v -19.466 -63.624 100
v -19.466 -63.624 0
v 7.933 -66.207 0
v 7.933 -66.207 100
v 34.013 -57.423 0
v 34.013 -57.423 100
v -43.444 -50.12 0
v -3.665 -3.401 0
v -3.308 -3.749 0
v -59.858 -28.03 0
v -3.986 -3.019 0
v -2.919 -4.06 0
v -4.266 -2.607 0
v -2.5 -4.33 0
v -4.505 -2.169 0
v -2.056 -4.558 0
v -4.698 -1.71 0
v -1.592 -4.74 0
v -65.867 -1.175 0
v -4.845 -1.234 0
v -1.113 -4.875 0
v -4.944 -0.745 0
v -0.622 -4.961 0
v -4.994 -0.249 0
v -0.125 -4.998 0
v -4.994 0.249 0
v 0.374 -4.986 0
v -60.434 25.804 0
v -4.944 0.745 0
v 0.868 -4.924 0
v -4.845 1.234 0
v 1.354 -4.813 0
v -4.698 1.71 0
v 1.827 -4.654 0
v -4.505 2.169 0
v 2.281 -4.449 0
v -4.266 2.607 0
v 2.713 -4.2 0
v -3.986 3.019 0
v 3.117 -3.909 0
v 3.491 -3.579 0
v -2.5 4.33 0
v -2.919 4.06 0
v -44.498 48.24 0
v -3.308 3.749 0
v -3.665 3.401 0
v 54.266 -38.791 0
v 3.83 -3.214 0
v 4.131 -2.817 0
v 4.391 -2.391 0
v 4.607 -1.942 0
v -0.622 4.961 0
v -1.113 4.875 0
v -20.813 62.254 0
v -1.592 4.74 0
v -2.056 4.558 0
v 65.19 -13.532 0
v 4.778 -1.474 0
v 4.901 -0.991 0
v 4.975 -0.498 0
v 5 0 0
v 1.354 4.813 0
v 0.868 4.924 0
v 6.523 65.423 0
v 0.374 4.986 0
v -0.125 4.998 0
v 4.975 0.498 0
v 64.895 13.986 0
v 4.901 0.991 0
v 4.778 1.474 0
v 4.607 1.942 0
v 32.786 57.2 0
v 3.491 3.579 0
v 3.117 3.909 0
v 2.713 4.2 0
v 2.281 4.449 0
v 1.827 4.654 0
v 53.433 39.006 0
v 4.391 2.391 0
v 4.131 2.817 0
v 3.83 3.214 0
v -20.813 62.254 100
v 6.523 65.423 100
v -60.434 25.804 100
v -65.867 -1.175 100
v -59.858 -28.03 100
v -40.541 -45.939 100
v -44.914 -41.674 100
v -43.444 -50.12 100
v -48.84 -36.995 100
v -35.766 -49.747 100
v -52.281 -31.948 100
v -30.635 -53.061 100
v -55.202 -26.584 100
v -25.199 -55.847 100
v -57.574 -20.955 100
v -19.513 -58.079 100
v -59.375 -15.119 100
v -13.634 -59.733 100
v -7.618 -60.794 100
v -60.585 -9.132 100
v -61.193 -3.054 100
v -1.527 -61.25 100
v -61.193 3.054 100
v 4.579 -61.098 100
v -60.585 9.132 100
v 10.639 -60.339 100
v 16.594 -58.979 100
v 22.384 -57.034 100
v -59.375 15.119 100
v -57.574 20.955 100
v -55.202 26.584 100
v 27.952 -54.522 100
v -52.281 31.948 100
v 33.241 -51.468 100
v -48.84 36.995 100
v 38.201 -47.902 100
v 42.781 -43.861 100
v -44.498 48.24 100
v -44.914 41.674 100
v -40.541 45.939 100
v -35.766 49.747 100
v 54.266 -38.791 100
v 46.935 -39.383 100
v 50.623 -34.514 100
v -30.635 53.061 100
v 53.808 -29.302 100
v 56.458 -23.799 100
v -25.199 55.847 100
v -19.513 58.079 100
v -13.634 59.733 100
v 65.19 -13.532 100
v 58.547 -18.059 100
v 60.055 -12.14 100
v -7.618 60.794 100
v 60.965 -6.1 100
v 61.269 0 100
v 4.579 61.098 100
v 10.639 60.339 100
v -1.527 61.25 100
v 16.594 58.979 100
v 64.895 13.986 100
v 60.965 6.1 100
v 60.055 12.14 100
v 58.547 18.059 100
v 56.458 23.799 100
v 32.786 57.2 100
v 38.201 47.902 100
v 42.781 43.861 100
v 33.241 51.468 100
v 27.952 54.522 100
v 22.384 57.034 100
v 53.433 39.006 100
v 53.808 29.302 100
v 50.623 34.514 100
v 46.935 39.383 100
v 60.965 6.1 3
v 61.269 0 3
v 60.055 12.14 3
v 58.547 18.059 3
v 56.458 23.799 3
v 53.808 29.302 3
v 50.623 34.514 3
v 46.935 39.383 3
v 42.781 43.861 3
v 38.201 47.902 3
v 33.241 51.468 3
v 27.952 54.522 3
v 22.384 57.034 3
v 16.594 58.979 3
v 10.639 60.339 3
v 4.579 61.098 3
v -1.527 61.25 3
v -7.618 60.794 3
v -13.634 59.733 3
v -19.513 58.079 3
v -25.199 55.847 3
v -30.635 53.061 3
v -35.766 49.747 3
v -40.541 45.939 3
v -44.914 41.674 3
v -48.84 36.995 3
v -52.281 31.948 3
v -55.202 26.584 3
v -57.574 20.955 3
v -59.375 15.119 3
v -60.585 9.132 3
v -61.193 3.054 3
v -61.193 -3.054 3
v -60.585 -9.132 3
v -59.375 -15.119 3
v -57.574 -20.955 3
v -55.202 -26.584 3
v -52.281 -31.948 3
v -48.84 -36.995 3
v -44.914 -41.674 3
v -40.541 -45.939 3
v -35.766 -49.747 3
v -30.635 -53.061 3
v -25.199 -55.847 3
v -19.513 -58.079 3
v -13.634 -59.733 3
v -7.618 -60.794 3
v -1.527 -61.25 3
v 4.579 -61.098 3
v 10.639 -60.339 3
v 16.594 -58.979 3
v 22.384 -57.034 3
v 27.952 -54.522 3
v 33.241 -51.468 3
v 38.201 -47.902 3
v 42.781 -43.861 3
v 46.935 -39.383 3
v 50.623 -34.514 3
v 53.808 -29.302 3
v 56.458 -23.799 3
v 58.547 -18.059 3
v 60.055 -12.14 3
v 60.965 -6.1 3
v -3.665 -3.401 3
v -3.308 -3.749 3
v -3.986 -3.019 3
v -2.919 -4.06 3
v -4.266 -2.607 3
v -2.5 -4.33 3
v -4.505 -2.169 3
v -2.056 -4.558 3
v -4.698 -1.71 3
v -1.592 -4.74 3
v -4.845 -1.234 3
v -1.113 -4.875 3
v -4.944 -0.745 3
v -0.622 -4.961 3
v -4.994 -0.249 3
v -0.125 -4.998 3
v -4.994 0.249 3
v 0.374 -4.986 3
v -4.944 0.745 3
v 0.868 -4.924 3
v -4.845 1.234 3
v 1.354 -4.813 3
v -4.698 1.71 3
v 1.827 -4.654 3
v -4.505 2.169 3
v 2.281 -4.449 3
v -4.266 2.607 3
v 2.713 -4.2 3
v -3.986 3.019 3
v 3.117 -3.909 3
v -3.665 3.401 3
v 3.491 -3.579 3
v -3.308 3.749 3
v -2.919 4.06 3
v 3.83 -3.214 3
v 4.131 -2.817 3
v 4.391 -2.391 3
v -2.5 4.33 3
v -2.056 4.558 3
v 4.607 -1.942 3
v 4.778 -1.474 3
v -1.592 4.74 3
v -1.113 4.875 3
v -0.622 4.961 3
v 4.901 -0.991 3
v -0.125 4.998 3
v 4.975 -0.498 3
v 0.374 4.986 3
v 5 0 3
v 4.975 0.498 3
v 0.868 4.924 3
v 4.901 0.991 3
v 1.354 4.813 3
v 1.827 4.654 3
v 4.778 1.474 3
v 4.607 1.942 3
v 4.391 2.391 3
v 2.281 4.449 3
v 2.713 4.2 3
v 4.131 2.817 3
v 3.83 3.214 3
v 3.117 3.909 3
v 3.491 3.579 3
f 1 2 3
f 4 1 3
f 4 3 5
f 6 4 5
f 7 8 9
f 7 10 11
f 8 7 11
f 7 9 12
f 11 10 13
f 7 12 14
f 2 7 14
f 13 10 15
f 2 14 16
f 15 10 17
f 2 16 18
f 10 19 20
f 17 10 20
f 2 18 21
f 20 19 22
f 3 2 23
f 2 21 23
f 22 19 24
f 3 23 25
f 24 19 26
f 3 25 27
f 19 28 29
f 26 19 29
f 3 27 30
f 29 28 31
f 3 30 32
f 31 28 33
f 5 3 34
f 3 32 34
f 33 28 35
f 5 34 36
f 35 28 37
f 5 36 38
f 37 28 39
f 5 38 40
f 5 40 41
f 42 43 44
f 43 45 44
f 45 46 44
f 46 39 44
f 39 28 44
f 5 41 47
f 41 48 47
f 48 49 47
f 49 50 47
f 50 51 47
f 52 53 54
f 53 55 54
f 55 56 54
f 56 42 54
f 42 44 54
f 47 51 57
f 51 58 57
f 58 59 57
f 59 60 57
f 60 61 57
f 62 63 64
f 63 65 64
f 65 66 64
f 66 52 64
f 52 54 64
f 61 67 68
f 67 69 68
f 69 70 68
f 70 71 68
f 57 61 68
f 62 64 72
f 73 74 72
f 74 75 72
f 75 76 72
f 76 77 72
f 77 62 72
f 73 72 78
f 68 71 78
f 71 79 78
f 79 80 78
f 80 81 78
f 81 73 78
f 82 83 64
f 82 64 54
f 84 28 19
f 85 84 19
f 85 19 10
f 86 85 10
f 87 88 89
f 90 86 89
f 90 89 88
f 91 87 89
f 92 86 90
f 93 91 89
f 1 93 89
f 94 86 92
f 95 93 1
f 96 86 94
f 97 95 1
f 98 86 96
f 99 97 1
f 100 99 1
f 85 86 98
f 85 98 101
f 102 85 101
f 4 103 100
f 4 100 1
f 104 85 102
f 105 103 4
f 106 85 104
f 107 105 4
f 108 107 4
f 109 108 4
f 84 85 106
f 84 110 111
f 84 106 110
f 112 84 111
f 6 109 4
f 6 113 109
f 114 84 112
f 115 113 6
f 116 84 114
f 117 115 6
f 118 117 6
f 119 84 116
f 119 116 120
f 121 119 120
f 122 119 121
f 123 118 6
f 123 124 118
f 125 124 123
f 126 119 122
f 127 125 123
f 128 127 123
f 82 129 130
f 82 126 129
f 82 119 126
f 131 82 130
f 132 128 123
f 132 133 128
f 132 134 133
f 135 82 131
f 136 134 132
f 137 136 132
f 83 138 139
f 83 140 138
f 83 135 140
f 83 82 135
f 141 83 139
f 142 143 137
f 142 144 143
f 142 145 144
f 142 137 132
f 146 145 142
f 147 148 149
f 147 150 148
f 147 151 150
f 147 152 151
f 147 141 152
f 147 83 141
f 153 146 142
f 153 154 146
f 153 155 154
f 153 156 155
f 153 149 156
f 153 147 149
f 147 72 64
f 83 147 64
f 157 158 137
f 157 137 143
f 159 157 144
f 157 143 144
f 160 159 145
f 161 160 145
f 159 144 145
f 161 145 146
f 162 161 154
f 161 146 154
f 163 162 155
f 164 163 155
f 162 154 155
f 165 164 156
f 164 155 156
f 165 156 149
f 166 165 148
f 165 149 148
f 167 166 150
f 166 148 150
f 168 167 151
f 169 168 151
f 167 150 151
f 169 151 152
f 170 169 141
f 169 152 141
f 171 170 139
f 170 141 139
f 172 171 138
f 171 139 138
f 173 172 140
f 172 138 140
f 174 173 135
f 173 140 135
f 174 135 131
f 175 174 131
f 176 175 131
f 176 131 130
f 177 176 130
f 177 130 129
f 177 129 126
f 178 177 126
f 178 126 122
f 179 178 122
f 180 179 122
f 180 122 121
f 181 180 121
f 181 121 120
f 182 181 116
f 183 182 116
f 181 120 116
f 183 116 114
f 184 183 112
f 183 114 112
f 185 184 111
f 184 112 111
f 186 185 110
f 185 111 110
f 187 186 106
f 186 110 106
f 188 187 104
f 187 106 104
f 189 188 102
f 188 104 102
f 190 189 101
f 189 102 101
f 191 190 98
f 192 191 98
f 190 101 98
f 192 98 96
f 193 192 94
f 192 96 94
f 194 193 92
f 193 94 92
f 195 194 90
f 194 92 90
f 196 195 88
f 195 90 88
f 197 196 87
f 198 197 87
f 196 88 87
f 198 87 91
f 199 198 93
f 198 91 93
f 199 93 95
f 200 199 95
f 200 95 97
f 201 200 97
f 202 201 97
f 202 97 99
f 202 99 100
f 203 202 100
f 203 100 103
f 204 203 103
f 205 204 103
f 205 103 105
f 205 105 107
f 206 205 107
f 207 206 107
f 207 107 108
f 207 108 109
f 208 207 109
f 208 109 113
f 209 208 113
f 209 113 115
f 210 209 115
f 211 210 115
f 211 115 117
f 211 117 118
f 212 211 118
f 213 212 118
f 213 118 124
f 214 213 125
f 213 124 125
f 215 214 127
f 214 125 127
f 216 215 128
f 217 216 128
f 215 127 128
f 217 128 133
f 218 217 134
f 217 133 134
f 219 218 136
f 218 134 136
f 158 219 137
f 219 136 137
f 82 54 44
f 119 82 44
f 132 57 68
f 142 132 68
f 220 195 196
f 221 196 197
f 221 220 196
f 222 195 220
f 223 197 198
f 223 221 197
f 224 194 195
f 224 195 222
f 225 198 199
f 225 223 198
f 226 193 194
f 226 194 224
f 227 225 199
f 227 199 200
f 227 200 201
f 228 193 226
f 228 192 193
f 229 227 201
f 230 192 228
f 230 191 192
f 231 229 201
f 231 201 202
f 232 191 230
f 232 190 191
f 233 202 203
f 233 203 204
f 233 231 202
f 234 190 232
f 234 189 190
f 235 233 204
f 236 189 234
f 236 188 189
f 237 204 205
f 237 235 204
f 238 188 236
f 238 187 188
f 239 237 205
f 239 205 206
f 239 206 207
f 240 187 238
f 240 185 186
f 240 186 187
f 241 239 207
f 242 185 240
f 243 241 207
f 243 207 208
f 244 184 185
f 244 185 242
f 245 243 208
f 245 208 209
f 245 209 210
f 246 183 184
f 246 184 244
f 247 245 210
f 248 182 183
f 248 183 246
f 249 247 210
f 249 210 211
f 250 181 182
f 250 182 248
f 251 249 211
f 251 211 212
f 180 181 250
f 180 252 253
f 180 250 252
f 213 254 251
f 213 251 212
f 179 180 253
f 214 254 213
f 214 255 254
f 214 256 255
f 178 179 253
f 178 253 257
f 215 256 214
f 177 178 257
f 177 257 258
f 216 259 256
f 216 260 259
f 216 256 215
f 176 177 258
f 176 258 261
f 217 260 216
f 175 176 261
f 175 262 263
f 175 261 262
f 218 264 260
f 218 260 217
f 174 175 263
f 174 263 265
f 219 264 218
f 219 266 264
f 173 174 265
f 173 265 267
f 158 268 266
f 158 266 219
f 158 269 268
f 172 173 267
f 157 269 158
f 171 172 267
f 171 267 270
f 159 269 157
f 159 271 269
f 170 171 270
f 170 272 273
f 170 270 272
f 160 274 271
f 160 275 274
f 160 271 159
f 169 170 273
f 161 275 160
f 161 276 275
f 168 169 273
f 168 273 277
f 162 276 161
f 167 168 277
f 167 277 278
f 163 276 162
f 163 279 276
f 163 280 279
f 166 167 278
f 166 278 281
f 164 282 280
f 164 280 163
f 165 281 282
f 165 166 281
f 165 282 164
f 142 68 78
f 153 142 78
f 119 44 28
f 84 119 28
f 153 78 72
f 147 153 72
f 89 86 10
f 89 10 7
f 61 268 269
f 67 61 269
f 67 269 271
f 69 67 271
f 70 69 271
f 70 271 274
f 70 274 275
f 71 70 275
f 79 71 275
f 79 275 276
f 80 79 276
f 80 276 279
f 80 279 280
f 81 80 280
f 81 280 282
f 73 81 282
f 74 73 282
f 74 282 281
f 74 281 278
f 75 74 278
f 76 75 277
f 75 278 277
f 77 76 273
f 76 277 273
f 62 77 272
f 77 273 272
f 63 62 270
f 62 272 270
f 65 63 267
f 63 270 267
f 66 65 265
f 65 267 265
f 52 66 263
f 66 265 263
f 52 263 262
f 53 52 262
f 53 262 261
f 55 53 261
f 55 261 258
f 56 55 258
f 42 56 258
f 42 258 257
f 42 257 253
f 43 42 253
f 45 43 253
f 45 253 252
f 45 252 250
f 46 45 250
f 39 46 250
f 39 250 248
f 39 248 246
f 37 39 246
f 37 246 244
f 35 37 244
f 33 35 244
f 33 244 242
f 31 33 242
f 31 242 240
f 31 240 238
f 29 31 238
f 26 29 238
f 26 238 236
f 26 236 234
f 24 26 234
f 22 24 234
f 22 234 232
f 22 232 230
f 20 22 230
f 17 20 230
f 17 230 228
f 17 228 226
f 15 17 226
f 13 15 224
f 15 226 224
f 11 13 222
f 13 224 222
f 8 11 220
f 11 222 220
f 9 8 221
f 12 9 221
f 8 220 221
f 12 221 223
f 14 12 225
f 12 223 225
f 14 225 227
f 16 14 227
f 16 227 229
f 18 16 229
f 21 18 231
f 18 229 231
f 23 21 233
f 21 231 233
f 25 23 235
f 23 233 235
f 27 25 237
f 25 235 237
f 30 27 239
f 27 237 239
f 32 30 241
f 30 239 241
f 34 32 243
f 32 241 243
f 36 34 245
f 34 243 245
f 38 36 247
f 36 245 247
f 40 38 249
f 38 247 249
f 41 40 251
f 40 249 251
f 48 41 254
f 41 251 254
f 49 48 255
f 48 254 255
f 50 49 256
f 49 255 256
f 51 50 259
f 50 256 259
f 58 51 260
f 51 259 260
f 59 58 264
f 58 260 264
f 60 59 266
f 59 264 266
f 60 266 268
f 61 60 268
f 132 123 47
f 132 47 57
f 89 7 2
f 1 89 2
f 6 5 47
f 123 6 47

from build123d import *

# Parameters (mm, degrees)
F1_DEPTH = 100
F2_R     = 61.269346
F3_DEPTH = 97
F4_R     = 5
F5_DEPTH = 25


with BuildPart() as f1:
    # F0 (on Top) → F1 (new body)
    with BuildSketch(Plane.XY):
        Polygon((6.523423, 65.423498), (-20.813363, 62.254017), (-44.497616, 48.239678), (-60.434112, 25.80369), (-65.867287, -1.174563), (-59.857696, -28.030294), (-43.444451, -50.119905), (-19.465552, -63.6239), (7.932832, -66.207316), (34.013272, -57.423458), (54.266222, -38.791133), (65.189763, -13.532041), (64.895117, 13.986292), (53.433229, 39.005697), (32.785965, 57.200091), align=None)
    extrude(amount=F1_DEPTH)

    # F2 (on face) → F3 (cut)
    with BuildSketch(Plane.XY.offset(100)):
        Circle(F2_R)
    extrude(amount=-F3_DEPTH, mode=Mode.SUBTRACT)

    # F4 (on face) → F5 (cut)
    with BuildSketch(Plane.XY.offset(3)):
        Circle(F4_R)
    extrude(amount=-F5_DEPTH, mode=Mode.SUBTRACT)


solid = f1.part
